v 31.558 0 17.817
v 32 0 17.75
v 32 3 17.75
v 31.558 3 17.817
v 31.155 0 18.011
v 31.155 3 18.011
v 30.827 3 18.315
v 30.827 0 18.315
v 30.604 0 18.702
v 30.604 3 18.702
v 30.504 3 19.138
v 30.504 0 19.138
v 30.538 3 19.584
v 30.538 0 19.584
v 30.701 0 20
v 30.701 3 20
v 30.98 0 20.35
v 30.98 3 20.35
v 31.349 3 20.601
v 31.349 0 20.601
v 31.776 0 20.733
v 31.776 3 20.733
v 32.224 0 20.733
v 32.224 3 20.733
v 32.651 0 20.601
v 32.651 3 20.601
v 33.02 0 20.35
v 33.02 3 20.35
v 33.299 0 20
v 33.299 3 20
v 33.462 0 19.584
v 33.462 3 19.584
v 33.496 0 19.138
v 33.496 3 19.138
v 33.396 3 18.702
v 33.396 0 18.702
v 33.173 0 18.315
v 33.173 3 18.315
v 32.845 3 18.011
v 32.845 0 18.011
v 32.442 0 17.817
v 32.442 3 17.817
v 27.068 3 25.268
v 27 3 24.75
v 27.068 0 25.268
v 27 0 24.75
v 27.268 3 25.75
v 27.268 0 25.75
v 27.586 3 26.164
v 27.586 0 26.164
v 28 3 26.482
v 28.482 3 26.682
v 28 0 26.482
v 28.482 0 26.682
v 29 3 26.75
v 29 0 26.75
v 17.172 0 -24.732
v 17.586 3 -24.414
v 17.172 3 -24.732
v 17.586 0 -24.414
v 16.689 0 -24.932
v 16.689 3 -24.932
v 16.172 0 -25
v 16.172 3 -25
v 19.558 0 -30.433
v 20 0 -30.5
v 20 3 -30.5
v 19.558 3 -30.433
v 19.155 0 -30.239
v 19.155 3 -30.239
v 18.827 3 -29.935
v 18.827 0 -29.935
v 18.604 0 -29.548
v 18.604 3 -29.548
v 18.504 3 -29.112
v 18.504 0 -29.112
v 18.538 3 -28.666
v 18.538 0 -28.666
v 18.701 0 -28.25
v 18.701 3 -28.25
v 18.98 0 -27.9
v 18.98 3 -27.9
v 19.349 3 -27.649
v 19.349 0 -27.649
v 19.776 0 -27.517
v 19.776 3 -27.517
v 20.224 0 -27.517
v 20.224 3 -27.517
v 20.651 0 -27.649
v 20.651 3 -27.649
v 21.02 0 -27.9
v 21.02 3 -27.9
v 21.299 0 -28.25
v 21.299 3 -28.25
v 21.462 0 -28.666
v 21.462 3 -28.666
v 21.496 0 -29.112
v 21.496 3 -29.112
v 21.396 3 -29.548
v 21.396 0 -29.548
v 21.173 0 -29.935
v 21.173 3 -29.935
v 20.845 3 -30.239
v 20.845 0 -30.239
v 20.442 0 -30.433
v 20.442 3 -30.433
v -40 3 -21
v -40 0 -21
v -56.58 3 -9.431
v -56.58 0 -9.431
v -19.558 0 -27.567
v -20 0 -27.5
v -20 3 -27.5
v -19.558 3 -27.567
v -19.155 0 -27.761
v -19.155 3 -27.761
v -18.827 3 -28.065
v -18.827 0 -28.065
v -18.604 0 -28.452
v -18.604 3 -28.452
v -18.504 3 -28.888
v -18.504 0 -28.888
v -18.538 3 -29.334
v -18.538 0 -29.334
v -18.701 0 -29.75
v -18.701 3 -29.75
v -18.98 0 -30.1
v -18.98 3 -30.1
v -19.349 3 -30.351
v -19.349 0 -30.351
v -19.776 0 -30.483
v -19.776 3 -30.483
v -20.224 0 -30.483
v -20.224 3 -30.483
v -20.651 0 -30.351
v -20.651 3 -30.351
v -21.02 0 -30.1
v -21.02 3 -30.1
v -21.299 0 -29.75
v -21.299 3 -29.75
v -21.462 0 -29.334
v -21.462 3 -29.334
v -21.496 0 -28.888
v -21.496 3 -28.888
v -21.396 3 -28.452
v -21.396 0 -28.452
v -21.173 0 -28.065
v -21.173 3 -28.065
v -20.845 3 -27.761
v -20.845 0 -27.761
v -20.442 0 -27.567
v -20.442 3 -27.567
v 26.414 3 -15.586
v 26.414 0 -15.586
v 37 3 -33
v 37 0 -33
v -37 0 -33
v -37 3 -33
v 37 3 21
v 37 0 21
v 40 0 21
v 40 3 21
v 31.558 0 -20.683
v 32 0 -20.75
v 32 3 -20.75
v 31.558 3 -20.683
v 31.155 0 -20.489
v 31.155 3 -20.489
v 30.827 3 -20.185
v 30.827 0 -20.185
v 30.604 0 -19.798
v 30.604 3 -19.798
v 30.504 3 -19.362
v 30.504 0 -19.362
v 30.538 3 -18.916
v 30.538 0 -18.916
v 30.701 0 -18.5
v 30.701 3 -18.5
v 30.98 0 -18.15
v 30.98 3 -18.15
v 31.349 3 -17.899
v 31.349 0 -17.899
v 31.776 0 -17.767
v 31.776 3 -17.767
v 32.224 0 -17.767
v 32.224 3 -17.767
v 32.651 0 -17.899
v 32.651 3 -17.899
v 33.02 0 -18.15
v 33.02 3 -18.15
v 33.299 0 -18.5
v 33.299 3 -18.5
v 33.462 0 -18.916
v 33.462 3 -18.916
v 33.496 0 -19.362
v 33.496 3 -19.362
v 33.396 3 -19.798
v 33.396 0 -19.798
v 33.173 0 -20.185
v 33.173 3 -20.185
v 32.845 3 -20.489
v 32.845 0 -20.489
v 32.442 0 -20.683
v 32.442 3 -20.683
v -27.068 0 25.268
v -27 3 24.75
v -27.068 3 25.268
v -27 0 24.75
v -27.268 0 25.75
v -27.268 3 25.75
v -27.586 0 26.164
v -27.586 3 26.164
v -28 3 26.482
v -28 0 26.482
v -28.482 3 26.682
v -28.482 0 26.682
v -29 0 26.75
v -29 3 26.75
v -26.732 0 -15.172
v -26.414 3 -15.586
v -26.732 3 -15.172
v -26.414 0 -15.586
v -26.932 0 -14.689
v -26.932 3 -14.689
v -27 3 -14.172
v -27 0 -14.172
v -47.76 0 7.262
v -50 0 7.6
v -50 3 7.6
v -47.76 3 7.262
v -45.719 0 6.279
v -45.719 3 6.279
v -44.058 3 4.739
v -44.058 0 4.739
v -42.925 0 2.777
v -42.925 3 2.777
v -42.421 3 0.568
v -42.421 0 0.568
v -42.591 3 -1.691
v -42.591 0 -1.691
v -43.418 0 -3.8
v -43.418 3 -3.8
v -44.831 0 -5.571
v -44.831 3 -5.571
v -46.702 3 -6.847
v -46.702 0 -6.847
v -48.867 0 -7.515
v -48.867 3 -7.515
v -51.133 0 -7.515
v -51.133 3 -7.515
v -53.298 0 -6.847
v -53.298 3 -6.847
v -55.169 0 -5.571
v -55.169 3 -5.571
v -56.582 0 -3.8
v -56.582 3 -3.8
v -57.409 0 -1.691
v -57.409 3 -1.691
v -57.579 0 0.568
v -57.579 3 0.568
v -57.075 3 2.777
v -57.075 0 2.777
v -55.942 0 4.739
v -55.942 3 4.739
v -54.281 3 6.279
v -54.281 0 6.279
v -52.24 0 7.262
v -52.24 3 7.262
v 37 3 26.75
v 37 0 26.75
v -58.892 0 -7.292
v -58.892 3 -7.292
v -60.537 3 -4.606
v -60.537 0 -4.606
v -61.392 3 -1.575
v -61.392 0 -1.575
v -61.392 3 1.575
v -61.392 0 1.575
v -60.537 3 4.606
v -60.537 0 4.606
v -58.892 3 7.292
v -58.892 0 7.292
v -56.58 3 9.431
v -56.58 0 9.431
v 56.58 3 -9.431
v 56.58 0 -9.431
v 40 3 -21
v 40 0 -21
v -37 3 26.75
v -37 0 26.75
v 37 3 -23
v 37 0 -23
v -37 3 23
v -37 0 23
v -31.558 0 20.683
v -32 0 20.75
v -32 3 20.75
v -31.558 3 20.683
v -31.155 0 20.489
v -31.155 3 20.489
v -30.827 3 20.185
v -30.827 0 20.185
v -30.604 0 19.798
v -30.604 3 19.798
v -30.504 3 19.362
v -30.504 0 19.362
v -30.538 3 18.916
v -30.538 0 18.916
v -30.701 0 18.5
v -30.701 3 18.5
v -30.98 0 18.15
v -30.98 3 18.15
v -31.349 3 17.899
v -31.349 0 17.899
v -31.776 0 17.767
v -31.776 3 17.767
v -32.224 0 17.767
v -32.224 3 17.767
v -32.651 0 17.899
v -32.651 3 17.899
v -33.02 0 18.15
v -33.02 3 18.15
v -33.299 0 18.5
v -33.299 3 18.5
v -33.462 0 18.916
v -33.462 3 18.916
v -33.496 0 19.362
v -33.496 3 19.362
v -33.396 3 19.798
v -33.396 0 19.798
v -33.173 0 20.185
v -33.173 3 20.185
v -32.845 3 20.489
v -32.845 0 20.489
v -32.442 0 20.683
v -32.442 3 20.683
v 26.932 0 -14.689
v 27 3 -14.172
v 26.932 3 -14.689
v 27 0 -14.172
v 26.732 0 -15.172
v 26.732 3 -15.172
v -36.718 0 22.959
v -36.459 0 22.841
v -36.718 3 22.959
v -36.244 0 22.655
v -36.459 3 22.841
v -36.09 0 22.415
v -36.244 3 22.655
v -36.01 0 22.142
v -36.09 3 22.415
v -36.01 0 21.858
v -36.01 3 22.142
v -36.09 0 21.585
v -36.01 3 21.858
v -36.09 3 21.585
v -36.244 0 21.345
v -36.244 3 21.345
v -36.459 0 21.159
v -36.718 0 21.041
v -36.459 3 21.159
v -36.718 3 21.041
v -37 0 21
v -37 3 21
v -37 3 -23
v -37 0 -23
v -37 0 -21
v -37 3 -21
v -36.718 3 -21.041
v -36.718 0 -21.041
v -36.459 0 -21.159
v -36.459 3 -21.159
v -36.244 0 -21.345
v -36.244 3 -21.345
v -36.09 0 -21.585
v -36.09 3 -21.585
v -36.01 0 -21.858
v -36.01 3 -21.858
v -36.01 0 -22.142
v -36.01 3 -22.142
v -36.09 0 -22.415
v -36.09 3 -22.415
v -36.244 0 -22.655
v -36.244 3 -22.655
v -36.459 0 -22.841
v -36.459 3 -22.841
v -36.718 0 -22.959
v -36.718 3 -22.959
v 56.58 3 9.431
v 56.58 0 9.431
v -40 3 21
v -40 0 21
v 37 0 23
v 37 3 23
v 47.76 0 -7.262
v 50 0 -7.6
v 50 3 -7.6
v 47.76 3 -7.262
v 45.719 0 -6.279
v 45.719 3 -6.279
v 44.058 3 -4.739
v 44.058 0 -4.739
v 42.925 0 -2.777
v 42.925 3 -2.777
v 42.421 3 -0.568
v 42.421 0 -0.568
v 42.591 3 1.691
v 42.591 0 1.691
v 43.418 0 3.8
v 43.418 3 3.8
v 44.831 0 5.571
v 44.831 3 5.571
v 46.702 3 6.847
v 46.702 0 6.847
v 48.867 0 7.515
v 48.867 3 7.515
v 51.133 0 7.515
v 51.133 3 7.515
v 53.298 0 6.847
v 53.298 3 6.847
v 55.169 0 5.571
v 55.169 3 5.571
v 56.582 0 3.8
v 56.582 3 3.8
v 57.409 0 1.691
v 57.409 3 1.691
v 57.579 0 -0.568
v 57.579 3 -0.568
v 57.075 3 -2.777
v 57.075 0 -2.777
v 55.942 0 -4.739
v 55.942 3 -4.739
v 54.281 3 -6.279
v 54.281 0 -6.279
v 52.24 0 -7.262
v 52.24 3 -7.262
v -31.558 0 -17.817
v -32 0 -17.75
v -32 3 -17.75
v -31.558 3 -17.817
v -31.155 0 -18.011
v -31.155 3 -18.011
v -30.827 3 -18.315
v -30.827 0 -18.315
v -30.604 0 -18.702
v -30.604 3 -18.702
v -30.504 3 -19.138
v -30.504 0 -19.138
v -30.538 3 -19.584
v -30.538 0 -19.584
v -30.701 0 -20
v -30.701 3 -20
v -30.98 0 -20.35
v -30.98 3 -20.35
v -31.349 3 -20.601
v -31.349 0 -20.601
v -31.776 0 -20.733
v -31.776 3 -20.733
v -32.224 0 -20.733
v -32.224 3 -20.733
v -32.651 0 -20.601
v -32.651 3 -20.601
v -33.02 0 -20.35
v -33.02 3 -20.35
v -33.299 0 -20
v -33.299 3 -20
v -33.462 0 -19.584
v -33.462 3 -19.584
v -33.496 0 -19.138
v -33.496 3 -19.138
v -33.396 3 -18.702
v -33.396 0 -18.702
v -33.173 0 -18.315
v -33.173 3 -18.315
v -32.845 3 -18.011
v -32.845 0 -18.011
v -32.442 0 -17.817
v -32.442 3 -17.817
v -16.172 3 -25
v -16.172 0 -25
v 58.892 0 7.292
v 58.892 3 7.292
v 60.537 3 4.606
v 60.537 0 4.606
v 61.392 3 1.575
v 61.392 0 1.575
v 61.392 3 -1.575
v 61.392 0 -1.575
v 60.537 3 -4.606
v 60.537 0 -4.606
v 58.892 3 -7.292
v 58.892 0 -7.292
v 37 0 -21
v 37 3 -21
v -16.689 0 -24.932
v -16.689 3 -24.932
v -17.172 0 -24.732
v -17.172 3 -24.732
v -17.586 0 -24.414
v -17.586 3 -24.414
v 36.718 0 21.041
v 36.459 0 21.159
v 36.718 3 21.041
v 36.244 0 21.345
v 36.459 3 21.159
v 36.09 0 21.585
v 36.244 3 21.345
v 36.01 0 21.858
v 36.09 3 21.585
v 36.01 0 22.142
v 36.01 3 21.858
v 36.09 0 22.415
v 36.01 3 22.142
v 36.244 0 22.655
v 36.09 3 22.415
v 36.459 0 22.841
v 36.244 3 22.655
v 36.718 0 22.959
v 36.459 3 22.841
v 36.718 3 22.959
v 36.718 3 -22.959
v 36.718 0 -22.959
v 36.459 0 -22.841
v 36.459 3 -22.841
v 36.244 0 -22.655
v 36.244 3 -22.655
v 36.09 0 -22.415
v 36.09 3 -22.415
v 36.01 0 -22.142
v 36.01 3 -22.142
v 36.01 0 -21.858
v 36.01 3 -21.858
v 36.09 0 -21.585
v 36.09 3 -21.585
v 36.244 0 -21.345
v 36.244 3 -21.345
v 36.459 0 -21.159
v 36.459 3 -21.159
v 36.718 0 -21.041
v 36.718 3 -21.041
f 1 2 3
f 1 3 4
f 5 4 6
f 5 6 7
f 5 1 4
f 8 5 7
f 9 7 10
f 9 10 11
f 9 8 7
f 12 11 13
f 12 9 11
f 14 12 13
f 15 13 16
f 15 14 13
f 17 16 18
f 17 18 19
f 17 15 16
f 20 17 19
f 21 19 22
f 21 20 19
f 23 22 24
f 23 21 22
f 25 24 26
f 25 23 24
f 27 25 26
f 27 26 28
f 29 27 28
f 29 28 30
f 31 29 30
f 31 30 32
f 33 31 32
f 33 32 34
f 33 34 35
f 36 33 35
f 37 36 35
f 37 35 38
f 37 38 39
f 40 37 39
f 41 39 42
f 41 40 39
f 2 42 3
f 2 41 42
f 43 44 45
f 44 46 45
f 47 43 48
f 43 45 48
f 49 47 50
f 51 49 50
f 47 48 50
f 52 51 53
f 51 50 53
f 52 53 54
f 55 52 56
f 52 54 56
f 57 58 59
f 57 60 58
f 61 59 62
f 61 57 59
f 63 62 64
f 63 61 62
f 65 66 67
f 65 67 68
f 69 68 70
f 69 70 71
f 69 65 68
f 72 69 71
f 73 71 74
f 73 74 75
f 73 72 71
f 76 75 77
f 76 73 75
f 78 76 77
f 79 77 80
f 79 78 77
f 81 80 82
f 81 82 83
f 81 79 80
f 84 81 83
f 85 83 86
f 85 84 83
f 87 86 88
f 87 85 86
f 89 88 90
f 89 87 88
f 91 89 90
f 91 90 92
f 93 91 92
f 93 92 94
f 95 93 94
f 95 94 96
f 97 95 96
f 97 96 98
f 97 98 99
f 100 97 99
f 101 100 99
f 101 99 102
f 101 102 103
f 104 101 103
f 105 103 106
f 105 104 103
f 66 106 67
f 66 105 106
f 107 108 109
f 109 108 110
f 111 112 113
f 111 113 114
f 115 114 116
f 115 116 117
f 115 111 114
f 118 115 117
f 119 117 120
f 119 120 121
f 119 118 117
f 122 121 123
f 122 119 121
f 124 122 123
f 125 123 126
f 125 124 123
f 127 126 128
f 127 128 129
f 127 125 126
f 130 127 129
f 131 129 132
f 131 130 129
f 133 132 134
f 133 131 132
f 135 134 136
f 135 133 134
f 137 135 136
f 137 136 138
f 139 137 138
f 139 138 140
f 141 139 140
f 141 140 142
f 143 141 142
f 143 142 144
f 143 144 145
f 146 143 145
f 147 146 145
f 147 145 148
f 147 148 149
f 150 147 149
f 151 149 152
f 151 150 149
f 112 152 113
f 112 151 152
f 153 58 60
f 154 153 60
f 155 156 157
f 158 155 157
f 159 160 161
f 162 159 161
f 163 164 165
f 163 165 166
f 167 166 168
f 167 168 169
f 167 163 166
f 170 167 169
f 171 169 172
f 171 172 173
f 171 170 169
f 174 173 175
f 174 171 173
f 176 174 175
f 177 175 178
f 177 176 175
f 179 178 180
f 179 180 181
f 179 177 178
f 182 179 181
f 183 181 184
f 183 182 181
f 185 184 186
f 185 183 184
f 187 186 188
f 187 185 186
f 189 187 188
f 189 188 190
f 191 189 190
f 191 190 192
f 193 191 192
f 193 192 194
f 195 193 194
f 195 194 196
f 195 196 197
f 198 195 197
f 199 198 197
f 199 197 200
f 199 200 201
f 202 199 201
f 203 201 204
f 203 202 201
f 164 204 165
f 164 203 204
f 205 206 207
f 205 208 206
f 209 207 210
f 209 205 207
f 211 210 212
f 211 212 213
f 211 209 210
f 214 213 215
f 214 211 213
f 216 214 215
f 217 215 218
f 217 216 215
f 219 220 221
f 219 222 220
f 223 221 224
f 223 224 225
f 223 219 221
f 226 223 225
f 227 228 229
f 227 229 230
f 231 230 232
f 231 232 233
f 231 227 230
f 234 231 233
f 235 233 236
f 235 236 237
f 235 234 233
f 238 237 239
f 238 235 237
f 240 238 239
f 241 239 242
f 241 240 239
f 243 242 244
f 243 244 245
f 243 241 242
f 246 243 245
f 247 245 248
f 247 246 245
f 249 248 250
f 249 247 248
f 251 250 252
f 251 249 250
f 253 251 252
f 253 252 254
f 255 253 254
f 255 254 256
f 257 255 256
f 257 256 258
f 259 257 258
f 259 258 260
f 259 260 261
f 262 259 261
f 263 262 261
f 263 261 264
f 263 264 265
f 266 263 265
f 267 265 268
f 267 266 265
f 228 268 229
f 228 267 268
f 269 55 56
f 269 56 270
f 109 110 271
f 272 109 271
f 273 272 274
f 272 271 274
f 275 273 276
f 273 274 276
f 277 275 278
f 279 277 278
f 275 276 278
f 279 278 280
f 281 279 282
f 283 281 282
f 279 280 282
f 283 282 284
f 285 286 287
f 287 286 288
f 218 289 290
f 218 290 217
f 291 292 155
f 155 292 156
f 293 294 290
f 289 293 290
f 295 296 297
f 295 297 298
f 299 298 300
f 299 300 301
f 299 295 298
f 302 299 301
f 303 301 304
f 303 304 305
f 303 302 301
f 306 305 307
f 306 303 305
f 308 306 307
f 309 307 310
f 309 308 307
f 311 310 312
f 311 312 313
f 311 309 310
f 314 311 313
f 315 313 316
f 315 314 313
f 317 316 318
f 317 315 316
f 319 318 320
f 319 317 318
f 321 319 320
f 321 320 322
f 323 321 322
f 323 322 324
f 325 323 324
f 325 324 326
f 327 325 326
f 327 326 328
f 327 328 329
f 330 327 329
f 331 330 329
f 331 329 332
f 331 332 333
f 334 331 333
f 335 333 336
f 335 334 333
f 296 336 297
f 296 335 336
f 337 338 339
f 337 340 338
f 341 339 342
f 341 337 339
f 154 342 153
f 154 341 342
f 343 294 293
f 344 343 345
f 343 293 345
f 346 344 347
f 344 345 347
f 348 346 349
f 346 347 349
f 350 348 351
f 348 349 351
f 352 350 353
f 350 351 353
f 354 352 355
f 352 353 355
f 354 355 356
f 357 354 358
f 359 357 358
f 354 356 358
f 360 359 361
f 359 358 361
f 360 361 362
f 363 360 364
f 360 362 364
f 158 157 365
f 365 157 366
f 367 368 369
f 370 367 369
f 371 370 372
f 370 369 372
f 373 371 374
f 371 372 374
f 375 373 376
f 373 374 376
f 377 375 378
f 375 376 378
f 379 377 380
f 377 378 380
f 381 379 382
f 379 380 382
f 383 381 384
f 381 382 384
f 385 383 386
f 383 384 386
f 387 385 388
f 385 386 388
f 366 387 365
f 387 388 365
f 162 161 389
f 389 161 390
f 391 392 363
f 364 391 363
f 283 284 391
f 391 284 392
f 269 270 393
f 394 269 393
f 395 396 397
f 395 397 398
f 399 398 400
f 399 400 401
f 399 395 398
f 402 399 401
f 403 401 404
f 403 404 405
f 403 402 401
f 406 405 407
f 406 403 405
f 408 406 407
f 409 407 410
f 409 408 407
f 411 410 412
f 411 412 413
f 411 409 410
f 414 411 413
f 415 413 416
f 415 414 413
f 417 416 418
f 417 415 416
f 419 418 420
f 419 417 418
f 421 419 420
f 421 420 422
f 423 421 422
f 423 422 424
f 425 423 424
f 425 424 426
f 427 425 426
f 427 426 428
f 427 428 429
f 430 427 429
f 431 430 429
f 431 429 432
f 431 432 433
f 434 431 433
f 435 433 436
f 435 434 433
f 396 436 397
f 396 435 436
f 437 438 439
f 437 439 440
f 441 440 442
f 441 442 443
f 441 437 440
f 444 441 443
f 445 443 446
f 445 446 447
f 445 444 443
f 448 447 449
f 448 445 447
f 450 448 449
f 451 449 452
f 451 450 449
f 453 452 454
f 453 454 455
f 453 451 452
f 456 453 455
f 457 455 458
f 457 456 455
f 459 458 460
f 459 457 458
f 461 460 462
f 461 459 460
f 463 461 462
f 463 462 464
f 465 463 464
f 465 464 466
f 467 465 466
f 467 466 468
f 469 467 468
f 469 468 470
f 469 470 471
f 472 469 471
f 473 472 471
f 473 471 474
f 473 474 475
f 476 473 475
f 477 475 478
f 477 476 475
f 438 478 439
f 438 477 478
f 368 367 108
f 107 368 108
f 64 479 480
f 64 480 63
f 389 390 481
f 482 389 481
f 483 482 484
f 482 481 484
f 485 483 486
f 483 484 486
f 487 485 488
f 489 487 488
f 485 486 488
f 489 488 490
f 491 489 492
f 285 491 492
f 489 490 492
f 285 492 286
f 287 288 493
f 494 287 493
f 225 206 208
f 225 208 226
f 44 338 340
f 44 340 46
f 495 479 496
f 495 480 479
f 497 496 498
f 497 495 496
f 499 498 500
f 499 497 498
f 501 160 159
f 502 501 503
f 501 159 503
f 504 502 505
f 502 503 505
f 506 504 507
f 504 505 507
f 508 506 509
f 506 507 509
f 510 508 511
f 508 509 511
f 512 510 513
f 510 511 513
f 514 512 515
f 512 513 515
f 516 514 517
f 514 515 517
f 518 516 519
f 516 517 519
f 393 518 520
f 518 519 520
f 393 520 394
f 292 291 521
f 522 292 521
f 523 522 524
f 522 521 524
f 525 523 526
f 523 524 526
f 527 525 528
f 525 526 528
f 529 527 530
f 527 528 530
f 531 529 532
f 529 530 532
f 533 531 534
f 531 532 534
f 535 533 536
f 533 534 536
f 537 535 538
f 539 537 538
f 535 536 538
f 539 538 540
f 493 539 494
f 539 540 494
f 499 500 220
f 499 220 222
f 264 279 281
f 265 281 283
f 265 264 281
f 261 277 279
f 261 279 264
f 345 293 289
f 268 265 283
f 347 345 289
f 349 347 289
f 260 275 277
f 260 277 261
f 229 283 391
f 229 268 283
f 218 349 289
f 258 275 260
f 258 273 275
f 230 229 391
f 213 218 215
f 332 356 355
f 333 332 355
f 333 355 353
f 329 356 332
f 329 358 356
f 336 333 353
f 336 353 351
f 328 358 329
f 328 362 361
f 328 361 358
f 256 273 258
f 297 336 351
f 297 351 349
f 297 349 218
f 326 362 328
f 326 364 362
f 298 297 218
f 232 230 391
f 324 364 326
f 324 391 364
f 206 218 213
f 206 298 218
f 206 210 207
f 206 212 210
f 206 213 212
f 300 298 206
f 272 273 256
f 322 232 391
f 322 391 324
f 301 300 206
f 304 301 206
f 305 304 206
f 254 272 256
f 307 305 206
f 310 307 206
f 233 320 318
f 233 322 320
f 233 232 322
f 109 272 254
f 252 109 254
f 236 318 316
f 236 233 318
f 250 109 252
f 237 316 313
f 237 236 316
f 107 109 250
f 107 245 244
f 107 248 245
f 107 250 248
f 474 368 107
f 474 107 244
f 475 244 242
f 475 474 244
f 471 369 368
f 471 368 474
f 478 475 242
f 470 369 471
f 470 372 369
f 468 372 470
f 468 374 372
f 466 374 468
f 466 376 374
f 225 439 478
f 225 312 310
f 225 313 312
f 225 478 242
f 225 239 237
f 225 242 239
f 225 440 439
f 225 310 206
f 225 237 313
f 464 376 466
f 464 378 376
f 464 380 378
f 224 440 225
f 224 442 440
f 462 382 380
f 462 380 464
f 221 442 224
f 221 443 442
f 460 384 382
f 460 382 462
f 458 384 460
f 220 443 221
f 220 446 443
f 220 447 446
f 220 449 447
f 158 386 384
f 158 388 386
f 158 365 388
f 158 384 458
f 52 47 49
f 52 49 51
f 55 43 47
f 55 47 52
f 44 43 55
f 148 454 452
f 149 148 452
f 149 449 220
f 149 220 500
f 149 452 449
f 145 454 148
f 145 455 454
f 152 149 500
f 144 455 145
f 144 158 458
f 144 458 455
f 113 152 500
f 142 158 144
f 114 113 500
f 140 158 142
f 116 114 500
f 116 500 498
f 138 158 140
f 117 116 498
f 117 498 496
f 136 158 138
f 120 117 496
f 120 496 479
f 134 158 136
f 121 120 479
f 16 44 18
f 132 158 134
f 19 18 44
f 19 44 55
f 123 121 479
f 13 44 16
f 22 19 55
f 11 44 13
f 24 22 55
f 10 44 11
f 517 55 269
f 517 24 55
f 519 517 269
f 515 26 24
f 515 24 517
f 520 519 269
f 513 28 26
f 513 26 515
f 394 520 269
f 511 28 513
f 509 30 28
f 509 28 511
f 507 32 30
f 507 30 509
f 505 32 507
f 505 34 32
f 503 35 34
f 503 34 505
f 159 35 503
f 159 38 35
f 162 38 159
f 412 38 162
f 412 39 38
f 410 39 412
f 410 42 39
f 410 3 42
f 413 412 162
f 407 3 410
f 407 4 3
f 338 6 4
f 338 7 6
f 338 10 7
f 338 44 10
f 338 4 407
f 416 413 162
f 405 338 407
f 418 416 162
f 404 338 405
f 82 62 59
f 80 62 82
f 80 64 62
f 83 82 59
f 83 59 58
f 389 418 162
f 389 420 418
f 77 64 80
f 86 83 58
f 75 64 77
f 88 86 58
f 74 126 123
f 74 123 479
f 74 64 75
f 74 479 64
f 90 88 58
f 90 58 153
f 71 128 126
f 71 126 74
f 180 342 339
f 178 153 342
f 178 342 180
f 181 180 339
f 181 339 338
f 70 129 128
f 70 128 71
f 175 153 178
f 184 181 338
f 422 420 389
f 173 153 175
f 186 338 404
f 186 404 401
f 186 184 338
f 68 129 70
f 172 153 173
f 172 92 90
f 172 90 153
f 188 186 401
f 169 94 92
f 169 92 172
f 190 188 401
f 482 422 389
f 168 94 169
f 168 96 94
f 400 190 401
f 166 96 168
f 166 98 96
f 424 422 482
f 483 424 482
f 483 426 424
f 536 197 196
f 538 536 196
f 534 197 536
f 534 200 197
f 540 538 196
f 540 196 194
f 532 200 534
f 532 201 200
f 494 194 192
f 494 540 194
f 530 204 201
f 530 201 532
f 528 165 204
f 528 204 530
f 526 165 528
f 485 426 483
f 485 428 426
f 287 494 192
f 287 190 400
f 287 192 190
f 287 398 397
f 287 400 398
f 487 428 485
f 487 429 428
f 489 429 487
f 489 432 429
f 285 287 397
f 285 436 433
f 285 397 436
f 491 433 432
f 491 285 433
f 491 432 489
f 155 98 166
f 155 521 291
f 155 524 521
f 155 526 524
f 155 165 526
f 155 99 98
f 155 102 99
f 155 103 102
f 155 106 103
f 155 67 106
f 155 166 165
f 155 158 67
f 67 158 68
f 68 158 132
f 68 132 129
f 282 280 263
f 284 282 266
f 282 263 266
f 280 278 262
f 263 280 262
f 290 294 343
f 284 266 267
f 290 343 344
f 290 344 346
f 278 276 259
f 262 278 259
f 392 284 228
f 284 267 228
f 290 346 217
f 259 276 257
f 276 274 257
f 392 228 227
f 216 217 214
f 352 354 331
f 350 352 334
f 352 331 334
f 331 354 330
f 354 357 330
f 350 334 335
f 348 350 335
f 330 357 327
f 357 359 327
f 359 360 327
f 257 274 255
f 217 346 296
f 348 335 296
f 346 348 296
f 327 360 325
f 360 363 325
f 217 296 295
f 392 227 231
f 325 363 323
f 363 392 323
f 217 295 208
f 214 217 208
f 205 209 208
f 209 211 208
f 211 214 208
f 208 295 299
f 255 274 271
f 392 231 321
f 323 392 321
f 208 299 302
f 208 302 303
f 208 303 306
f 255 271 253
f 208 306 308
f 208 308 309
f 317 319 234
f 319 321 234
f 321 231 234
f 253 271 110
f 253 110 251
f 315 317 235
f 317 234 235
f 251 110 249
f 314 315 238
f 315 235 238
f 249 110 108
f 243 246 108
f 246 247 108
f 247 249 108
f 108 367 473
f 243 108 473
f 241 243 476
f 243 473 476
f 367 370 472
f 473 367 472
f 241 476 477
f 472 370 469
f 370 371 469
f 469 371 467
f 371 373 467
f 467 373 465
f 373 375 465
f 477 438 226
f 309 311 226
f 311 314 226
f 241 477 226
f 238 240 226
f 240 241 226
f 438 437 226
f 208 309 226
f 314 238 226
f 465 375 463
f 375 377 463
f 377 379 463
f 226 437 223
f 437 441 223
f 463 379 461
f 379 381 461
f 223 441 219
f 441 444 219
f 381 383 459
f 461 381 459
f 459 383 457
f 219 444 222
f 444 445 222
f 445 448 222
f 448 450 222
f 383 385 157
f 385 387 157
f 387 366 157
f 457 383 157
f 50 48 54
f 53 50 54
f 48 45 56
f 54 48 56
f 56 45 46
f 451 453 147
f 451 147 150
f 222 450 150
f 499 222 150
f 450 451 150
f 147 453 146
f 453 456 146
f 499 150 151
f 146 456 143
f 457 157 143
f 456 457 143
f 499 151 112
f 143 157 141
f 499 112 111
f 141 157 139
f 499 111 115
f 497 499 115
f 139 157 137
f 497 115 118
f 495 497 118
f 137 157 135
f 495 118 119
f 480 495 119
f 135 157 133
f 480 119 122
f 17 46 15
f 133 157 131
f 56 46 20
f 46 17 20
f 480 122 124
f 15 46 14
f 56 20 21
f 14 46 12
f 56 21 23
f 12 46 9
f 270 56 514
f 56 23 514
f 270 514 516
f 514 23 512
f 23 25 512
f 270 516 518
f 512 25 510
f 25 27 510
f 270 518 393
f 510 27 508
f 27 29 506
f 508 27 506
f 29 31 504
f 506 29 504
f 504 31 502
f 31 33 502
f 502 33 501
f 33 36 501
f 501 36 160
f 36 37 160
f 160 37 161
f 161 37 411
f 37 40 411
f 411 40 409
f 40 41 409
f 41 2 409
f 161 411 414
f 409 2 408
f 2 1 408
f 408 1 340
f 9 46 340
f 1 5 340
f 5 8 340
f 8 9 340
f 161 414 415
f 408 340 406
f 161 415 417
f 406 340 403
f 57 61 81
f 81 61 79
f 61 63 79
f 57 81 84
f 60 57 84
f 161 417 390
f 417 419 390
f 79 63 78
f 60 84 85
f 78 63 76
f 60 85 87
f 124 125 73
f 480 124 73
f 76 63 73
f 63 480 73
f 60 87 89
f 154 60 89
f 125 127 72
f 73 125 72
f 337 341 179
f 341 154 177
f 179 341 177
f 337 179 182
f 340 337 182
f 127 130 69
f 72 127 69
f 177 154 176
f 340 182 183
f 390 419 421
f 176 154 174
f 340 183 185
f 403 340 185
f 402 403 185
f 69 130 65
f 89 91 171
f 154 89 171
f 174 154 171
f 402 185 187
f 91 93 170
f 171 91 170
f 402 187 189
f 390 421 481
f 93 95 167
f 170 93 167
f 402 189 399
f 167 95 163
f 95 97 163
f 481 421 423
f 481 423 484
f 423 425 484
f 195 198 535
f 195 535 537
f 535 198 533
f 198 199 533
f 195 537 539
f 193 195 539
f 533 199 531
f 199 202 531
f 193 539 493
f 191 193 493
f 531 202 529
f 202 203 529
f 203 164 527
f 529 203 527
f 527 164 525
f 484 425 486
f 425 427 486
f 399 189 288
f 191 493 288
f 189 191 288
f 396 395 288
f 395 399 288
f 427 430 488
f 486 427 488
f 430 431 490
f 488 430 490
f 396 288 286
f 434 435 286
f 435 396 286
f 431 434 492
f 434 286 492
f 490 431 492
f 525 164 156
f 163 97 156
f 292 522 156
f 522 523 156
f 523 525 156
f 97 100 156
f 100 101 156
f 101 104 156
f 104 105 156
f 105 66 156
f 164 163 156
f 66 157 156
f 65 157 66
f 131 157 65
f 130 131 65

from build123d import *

# Parameters (mm, degrees)
SKETCH_1_R          = 7.6
SKETCH_1_R_2        = 1.5
EXTRUDE_1_DEPTH     = 3
SKETCH_2_R          = 1
CUT_EXTRUDE_1_DEPTH = 70.858786133
CUT_EXTRUDE_2_DEPTH = 70.858786133
CHAMFER_1_SIZE      = 10
FILLET_2_R          = 2


with BuildPart() as part:
    # 草图1 → 凸台-拉伸1 (new body)
    with BuildSketch(Plane(origin=(0, 0, 0), x_dir=(1, 0, 0), z_dir=(0, 1, 0))):
        with BuildLine():
            Line((-37, 33), (-37, 21))
            Line((-37, 21), (-40, 21))
            Line((-40, 21), (-56.580484914, 9.431183292))
            ThreePointArc((-56.580484914, 9.431183292), (-61.5, 0), (-56.580484914, -9.431183292))
            Line((-56.580484914, -9.431183292), (-40, -21))
            Line((-40, -21), (-37, -21))
            Line((-37, -21), (-37, -33))
            Line((-37, -33), (37, -33))
            Line((37, -33), (37, -21))
            Line((37, -21), (40, -21))
            Line((40, -21), (56.580484914, -9.431183292))
            ThreePointArc((56.580484914, -9.431183292), (61.5, 0), (56.580484914, 9.431183292))
            Line((56.580484914, 9.431183292), (40, 21))
            Line((40, 21), (37, 21))
            Line((37, 21), (37, 33))
            Line((37, 33), (-37, 33))
        make_face()
        with Locations(Location((-50, 0, 0), (0, 0, 270))):
            Circle(SKETCH_1_R, mode=Mode.SUBTRACT)
        with Locations(Location((50, 0, 0), (0, 0, 90))):
            Circle(SKETCH_1_R, mode=Mode.SUBTRACT)
        with Locations(Location((32, 19.25, 0), (0, 0, 90))):
            Circle(SKETCH_1_R_2, mode=Mode.SUBTRACT)
        with Locations(Location((32, -19.25, 0), (0, 0, 90))):
            Circle(SKETCH_1_R_2, mode=Mode.SUBTRACT)
        with Locations(Location((-32, -19.25, 0), (0, 0, 270))):
            Circle(SKETCH_1_R_2, mode=Mode.SUBTRACT)
        with Locations(Location((-32, 19.25, 0), (0, 0, 270))):
            Circle(SKETCH_1_R_2, mode=Mode.SUBTRACT)
        with Locations(Location((-20, 29, 0), (0, 0, 270))):
            Circle(SKETCH_1_R_2, mode=Mode.SUBTRACT)
        with Locations(Location((20, 29, 0), (0, 0, 90))):
            Circle(SKETCH_1_R_2, mode=Mode.SUBTRACT)
    extrude(amount=EXTRUDE_1_DEPTH)

    # 草图2 → 切除-拉伸1 (cut, through all)
    with BuildSketch(Plane(origin=(0, 3, 0), x_dir=(1, 0, 0), z_dir=(0, 1, 0))):
        with Locations((-37, 22)):
            Circle(SKETCH_2_R)
        with Locations((-37, -22)):
            Circle(SKETCH_2_R)
        with Locations((37, -22)):
            Circle(SKETCH_2_R)
        with Locations((37, 22)):
            Circle(SKETCH_2_R)
    extrude(amount=-CUT_EXTRUDE_1_DEPTH, mode=Mode.SUBTRACT)

    # 草图3 → 切除-拉伸2 (cut, through all)
    with BuildSketch(Plane(origin=(0, 3, 0), x_dir=(1, 0, 0), z_dir=(0, 1, 0))):
        Polygon((-27, -26.75), (-27, 25), (27, 25), (27, -26.75), (37, -26.75), (37, -33), (-37, -33), (-37, -26.75), align=None)
    extrude(amount=-CUT_EXTRUDE_2_DEPTH, mode=Mode.SUBTRACT)

    # 倒角1
    chamfer_1_edges = [part.edges().sort_by_distance(p)[0] for p in [
        (-27, 1.5, -25),
        (27, 1.5, -25),
    ]]
    chamfer(chamfer_1_edges, length=CHAMFER_1_SIZE)

    # 圆角2
    fillet_2_edges = [part.edges().sort_by_distance(p)[0] for p in [
        (-27, 1.5, 26.75),
        (27, 1.5, 26.75),
        (-17, 1.5, -25),
        (17, 1.5, -25),
        (27, 1.5, -15),
        (-27, 1.5, -15),
    ]]
    fillet(fillet_2_edges, radius=FILLET_2_R)


solid = part.part
